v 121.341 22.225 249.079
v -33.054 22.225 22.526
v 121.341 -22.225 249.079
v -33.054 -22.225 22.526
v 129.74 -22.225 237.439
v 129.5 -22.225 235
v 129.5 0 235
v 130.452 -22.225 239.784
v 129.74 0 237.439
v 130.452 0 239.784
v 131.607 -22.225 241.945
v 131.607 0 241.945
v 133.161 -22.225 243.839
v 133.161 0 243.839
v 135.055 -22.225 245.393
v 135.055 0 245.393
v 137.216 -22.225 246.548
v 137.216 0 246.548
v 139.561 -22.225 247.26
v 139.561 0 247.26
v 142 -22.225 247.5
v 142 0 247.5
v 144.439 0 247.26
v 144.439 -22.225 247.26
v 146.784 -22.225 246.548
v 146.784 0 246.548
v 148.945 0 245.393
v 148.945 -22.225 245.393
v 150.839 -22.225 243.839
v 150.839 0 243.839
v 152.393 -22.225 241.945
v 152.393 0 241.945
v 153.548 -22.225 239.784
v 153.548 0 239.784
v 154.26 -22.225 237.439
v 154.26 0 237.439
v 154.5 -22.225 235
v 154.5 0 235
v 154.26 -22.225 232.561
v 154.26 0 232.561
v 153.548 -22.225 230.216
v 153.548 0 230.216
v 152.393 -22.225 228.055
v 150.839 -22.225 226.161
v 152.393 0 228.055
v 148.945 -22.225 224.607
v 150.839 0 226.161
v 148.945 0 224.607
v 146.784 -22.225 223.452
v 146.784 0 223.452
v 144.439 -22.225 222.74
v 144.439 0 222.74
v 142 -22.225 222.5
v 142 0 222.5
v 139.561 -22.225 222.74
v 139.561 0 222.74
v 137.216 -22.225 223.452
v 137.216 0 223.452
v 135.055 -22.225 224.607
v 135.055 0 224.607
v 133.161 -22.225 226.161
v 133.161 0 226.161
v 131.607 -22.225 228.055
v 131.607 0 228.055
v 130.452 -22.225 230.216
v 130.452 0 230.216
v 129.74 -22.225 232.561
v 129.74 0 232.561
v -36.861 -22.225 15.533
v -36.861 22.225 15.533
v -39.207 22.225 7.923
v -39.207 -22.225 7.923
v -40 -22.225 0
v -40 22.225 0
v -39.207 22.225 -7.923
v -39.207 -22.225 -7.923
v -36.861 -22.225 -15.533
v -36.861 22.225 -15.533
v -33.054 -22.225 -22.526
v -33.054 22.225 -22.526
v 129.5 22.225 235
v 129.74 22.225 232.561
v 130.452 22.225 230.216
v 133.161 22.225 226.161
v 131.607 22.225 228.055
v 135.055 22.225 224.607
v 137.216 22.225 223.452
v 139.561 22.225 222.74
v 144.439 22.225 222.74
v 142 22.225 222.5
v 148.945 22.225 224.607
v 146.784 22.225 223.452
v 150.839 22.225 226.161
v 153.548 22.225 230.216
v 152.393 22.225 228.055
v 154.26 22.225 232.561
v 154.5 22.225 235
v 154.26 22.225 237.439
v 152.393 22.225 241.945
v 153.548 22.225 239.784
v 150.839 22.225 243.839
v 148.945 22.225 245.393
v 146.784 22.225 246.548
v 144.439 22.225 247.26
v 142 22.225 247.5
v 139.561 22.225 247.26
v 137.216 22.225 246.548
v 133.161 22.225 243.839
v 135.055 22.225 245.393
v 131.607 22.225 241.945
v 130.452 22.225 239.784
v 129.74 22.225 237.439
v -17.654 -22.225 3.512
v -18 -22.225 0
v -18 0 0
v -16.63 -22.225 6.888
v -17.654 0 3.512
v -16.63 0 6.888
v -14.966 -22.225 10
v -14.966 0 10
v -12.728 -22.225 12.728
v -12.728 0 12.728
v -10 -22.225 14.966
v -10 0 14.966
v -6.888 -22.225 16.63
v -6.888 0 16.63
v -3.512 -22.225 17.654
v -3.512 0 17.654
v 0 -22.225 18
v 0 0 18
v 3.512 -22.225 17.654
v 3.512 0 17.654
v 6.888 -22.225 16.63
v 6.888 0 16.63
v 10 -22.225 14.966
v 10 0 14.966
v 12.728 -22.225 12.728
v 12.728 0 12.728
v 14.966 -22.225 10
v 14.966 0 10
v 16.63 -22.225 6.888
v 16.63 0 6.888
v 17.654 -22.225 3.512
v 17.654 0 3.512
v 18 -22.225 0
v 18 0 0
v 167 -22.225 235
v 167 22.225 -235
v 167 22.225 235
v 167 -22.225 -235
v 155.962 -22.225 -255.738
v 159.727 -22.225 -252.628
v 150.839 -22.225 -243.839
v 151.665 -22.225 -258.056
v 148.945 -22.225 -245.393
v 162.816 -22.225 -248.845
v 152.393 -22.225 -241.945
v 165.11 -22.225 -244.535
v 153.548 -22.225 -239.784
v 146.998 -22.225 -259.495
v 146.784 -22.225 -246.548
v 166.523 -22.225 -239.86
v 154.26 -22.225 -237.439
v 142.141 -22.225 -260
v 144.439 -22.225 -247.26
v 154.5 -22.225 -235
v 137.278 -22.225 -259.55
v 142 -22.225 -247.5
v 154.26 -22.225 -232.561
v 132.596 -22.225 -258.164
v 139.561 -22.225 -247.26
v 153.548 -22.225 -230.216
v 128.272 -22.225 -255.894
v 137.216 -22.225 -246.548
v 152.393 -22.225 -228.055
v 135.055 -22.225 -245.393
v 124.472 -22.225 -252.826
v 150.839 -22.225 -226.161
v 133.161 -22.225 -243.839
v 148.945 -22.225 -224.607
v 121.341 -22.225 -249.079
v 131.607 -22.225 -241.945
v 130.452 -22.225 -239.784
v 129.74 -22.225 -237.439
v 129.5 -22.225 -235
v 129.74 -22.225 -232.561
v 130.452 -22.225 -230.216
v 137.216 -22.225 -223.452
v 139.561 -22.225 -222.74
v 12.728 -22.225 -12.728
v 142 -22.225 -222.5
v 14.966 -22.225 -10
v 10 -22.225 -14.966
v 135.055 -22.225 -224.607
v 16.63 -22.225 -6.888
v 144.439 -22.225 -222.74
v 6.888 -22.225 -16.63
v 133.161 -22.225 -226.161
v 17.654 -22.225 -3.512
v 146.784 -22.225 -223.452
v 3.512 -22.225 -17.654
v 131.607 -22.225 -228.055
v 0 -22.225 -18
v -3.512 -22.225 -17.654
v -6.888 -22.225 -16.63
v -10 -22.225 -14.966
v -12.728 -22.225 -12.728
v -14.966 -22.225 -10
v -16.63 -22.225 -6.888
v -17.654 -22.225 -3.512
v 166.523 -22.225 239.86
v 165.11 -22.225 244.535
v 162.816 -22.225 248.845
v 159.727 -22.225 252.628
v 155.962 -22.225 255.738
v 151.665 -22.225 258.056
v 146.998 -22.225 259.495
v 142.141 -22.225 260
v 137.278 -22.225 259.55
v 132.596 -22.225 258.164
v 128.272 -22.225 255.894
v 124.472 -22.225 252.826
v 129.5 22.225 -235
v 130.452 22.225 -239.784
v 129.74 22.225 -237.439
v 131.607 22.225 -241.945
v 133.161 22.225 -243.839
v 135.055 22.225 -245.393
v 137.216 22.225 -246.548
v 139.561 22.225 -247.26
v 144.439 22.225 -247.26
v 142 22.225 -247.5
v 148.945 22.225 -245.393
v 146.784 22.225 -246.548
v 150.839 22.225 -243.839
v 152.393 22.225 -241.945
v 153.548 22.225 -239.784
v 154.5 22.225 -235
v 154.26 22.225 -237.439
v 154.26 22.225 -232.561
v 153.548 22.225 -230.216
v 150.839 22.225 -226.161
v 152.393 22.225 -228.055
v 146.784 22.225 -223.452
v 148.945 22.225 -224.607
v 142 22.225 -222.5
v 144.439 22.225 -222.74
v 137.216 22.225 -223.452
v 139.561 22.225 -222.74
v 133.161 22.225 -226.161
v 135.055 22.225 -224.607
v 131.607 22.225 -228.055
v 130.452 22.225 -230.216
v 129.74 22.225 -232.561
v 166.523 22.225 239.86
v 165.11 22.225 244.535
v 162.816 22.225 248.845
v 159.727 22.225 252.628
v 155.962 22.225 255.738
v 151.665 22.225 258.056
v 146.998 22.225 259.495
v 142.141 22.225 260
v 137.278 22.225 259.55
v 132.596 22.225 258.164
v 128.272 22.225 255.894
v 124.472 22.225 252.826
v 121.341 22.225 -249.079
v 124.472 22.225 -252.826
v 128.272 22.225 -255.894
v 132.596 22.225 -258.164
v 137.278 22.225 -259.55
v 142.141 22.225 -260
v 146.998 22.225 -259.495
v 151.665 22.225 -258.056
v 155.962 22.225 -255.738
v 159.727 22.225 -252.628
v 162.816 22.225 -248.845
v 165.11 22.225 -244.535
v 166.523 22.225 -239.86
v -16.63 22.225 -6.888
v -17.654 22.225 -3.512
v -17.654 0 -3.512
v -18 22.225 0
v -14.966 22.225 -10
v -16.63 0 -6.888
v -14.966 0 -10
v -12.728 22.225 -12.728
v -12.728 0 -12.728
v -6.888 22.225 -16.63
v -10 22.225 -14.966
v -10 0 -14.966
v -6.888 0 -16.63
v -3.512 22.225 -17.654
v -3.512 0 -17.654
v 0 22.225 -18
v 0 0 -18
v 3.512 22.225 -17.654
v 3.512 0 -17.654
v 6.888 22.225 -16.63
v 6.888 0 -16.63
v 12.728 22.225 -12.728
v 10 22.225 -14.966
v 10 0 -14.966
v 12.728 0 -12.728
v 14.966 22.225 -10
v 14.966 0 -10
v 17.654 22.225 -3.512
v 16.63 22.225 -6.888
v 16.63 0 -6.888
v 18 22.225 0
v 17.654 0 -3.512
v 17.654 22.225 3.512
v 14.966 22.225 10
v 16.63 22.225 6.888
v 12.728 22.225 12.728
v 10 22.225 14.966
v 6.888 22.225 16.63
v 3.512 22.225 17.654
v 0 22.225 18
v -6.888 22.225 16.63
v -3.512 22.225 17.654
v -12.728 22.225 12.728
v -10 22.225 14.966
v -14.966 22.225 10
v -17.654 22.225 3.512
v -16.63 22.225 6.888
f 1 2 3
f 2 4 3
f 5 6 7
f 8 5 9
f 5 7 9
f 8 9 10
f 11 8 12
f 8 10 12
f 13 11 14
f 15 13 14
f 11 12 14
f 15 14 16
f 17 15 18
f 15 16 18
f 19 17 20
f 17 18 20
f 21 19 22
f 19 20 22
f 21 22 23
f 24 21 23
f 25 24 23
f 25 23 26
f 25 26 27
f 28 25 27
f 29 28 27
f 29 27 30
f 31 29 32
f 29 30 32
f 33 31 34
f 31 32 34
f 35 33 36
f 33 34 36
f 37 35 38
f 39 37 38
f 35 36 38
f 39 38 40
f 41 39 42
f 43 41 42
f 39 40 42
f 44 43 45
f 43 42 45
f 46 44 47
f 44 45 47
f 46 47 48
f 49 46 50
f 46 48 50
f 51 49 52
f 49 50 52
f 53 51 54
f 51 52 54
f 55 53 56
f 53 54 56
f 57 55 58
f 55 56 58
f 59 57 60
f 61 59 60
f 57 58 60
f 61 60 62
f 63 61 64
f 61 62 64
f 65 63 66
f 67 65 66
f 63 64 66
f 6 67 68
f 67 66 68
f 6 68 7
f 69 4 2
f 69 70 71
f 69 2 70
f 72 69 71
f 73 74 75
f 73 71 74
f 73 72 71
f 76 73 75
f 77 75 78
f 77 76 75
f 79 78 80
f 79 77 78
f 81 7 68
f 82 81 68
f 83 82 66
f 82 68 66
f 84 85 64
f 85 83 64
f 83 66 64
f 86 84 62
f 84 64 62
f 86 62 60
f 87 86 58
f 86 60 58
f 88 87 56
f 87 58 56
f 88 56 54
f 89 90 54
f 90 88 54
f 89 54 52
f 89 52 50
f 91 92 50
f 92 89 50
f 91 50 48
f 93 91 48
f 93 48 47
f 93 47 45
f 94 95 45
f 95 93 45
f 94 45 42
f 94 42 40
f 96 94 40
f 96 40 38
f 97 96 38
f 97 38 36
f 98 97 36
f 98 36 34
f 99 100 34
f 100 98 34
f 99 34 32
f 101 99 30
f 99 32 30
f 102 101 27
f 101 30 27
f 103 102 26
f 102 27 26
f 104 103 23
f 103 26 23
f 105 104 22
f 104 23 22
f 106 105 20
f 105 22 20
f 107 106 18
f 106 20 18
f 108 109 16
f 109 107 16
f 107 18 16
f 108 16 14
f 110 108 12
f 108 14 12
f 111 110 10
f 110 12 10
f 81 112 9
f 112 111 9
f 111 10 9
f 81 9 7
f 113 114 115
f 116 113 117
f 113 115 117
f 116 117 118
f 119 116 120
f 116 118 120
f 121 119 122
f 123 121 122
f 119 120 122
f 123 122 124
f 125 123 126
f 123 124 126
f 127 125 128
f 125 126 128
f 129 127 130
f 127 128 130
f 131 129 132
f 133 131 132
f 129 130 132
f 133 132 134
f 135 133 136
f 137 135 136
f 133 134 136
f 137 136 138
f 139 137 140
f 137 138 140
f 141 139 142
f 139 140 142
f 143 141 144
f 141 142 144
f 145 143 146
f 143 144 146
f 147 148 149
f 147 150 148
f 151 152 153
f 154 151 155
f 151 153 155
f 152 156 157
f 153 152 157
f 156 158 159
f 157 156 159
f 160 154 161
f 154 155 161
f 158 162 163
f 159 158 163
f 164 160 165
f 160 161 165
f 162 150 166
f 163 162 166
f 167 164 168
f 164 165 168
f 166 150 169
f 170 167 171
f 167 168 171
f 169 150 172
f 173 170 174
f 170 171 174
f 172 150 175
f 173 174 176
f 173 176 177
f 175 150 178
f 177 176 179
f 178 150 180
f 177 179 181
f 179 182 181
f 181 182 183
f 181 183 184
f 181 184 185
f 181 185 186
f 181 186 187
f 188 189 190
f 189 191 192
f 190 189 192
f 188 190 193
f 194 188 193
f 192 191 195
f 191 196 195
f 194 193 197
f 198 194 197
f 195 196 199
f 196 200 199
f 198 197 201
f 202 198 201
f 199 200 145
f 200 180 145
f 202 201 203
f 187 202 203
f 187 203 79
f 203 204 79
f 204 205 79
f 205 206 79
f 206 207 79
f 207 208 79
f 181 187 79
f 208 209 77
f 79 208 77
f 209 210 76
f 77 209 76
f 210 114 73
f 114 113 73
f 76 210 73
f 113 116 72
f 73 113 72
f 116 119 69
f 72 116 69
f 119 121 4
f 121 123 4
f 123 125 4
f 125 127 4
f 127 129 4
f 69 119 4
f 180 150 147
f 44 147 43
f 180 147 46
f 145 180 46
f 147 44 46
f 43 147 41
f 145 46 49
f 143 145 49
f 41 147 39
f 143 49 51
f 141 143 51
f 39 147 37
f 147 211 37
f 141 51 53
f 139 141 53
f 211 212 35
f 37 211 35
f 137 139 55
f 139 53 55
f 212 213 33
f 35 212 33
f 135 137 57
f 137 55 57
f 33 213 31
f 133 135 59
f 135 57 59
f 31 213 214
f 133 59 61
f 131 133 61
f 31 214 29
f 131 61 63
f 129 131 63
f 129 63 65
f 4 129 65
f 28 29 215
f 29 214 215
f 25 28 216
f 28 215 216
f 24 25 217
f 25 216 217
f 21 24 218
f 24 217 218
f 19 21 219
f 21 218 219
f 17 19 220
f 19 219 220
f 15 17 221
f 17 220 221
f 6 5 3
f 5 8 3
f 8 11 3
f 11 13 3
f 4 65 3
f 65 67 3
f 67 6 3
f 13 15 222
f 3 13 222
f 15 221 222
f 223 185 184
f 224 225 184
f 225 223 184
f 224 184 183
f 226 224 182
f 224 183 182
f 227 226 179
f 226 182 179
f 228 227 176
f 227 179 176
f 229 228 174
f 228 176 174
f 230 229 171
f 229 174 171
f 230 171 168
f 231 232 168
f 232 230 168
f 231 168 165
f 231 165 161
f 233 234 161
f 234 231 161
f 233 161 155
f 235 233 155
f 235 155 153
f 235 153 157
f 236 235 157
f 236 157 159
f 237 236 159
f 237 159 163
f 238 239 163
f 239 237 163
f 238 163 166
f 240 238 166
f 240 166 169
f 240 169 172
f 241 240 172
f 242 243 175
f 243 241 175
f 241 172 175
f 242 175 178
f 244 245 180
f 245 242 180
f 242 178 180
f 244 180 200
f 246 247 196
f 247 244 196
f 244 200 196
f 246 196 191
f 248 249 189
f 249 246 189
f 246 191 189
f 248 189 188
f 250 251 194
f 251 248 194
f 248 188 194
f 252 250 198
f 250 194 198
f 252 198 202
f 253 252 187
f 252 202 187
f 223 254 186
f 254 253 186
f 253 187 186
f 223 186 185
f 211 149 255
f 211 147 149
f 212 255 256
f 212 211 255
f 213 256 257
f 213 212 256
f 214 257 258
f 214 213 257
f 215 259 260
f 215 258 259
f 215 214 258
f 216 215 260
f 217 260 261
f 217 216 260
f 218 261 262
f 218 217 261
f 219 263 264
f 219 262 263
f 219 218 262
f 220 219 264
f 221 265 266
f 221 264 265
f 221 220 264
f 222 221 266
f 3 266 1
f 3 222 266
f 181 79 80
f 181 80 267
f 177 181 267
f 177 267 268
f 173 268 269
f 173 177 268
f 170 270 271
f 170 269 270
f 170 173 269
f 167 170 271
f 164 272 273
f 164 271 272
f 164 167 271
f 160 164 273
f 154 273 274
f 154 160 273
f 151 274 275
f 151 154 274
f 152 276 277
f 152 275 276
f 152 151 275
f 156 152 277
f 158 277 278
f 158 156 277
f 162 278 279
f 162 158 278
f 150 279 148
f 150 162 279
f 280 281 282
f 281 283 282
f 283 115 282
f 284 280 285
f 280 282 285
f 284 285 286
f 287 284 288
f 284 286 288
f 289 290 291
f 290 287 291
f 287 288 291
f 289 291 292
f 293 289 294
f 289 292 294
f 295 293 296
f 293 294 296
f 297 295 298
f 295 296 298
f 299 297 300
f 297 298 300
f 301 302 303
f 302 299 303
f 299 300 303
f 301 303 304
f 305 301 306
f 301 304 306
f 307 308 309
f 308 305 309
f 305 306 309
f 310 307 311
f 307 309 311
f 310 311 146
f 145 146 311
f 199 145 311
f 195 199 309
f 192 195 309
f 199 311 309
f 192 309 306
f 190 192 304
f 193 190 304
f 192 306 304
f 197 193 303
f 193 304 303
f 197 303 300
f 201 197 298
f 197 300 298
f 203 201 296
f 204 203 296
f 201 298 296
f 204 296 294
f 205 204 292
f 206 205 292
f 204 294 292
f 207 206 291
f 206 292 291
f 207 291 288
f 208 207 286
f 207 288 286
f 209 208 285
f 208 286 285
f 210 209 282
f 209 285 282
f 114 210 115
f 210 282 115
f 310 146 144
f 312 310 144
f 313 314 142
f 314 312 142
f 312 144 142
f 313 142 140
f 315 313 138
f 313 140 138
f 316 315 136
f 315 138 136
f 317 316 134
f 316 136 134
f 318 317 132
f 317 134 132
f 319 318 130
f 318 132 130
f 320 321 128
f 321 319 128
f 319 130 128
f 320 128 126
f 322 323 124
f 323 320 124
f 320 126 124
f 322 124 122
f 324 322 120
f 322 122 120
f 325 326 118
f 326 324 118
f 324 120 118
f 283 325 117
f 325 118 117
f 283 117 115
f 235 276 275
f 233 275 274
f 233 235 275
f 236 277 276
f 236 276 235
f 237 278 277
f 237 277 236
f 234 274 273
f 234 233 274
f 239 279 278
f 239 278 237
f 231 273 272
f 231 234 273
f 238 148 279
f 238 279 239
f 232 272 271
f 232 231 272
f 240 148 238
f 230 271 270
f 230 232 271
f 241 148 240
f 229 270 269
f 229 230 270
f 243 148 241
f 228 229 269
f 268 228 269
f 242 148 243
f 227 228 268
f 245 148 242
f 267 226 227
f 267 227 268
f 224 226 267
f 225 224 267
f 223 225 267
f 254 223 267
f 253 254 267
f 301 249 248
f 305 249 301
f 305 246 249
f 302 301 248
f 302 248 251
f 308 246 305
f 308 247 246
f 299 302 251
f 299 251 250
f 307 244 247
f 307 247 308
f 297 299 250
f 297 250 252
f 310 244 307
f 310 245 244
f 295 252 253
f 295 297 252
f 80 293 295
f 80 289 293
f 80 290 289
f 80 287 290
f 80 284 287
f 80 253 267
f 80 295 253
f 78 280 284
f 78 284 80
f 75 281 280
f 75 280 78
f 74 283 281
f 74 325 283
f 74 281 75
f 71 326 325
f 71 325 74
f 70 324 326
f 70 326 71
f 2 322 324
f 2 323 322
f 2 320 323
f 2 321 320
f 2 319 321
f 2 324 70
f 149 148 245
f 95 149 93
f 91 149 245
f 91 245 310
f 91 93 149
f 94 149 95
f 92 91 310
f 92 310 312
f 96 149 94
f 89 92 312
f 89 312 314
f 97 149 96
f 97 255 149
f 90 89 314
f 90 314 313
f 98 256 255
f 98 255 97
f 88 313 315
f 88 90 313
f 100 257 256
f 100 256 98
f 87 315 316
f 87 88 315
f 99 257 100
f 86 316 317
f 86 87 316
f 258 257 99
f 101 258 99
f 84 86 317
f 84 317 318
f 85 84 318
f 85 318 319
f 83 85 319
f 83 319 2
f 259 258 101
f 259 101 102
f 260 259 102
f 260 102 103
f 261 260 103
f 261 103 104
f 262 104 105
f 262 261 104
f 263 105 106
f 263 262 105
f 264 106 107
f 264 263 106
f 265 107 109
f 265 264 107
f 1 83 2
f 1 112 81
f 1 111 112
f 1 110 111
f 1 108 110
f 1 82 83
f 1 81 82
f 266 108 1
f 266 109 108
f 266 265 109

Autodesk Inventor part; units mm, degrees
ref_plane "YZ Plane" through (0, 0, 0) normal (1, 0, 0) x (0, 1, 0)
ref_plane "XZ Plane" through (0, 0, 0) normal (0, 1, 0) x (-1, 0, 0)
ref_plane "XY Plane" through (0, 0, 0) normal (0, 0, 1) x (1, 0, 0)
sketch "Sketch1" plane through (0, 0, 0) normal (0, 1, 0) x (-1, 0, 0)
  circle A0 centre (0, 0) radius 18
  line L0 (33.054, 22.5263) -> (-121.3412, 249.0789)
  line L1 (-167, 235) -> (-167, 75.4136)
  circle A1 centre (-142, 235) radius 12.5
  line L2 (0, 0) -> (-142, 0)
  line L3 (33.054, -22.5263) -> (-121.3412, -249.0789)
  line L4 (-167, -235) -> (-167, 75.4136)
  circle A2 centre (-142, -235) radius 12.5
  arc A3 (-121.3412, 249.0789) -> (-167, 235) centre (-142, 235) ccw
  arc A4 (33.054, -22.5263) -> (33.054, 22.5263) centre (0, 0) ccw
  arc A5 (-167, -235) -> (-121.3412, -249.0789) centre (-142, -235) ccw
  point P0 (-167, 316.0765)
  point P1 (-167, -316.0765)
  dimension "d0" = 36
  dimension "d1" = 25
  dimension "d4" = 142
  dimension "d6" = 470
  dimension "d9" = 25
  dimension "d10" = 40
extrude "Extrusion1" add sketch "Sketch1" along normal mid plane 44.45
properties part number "Espacador_Delta"
